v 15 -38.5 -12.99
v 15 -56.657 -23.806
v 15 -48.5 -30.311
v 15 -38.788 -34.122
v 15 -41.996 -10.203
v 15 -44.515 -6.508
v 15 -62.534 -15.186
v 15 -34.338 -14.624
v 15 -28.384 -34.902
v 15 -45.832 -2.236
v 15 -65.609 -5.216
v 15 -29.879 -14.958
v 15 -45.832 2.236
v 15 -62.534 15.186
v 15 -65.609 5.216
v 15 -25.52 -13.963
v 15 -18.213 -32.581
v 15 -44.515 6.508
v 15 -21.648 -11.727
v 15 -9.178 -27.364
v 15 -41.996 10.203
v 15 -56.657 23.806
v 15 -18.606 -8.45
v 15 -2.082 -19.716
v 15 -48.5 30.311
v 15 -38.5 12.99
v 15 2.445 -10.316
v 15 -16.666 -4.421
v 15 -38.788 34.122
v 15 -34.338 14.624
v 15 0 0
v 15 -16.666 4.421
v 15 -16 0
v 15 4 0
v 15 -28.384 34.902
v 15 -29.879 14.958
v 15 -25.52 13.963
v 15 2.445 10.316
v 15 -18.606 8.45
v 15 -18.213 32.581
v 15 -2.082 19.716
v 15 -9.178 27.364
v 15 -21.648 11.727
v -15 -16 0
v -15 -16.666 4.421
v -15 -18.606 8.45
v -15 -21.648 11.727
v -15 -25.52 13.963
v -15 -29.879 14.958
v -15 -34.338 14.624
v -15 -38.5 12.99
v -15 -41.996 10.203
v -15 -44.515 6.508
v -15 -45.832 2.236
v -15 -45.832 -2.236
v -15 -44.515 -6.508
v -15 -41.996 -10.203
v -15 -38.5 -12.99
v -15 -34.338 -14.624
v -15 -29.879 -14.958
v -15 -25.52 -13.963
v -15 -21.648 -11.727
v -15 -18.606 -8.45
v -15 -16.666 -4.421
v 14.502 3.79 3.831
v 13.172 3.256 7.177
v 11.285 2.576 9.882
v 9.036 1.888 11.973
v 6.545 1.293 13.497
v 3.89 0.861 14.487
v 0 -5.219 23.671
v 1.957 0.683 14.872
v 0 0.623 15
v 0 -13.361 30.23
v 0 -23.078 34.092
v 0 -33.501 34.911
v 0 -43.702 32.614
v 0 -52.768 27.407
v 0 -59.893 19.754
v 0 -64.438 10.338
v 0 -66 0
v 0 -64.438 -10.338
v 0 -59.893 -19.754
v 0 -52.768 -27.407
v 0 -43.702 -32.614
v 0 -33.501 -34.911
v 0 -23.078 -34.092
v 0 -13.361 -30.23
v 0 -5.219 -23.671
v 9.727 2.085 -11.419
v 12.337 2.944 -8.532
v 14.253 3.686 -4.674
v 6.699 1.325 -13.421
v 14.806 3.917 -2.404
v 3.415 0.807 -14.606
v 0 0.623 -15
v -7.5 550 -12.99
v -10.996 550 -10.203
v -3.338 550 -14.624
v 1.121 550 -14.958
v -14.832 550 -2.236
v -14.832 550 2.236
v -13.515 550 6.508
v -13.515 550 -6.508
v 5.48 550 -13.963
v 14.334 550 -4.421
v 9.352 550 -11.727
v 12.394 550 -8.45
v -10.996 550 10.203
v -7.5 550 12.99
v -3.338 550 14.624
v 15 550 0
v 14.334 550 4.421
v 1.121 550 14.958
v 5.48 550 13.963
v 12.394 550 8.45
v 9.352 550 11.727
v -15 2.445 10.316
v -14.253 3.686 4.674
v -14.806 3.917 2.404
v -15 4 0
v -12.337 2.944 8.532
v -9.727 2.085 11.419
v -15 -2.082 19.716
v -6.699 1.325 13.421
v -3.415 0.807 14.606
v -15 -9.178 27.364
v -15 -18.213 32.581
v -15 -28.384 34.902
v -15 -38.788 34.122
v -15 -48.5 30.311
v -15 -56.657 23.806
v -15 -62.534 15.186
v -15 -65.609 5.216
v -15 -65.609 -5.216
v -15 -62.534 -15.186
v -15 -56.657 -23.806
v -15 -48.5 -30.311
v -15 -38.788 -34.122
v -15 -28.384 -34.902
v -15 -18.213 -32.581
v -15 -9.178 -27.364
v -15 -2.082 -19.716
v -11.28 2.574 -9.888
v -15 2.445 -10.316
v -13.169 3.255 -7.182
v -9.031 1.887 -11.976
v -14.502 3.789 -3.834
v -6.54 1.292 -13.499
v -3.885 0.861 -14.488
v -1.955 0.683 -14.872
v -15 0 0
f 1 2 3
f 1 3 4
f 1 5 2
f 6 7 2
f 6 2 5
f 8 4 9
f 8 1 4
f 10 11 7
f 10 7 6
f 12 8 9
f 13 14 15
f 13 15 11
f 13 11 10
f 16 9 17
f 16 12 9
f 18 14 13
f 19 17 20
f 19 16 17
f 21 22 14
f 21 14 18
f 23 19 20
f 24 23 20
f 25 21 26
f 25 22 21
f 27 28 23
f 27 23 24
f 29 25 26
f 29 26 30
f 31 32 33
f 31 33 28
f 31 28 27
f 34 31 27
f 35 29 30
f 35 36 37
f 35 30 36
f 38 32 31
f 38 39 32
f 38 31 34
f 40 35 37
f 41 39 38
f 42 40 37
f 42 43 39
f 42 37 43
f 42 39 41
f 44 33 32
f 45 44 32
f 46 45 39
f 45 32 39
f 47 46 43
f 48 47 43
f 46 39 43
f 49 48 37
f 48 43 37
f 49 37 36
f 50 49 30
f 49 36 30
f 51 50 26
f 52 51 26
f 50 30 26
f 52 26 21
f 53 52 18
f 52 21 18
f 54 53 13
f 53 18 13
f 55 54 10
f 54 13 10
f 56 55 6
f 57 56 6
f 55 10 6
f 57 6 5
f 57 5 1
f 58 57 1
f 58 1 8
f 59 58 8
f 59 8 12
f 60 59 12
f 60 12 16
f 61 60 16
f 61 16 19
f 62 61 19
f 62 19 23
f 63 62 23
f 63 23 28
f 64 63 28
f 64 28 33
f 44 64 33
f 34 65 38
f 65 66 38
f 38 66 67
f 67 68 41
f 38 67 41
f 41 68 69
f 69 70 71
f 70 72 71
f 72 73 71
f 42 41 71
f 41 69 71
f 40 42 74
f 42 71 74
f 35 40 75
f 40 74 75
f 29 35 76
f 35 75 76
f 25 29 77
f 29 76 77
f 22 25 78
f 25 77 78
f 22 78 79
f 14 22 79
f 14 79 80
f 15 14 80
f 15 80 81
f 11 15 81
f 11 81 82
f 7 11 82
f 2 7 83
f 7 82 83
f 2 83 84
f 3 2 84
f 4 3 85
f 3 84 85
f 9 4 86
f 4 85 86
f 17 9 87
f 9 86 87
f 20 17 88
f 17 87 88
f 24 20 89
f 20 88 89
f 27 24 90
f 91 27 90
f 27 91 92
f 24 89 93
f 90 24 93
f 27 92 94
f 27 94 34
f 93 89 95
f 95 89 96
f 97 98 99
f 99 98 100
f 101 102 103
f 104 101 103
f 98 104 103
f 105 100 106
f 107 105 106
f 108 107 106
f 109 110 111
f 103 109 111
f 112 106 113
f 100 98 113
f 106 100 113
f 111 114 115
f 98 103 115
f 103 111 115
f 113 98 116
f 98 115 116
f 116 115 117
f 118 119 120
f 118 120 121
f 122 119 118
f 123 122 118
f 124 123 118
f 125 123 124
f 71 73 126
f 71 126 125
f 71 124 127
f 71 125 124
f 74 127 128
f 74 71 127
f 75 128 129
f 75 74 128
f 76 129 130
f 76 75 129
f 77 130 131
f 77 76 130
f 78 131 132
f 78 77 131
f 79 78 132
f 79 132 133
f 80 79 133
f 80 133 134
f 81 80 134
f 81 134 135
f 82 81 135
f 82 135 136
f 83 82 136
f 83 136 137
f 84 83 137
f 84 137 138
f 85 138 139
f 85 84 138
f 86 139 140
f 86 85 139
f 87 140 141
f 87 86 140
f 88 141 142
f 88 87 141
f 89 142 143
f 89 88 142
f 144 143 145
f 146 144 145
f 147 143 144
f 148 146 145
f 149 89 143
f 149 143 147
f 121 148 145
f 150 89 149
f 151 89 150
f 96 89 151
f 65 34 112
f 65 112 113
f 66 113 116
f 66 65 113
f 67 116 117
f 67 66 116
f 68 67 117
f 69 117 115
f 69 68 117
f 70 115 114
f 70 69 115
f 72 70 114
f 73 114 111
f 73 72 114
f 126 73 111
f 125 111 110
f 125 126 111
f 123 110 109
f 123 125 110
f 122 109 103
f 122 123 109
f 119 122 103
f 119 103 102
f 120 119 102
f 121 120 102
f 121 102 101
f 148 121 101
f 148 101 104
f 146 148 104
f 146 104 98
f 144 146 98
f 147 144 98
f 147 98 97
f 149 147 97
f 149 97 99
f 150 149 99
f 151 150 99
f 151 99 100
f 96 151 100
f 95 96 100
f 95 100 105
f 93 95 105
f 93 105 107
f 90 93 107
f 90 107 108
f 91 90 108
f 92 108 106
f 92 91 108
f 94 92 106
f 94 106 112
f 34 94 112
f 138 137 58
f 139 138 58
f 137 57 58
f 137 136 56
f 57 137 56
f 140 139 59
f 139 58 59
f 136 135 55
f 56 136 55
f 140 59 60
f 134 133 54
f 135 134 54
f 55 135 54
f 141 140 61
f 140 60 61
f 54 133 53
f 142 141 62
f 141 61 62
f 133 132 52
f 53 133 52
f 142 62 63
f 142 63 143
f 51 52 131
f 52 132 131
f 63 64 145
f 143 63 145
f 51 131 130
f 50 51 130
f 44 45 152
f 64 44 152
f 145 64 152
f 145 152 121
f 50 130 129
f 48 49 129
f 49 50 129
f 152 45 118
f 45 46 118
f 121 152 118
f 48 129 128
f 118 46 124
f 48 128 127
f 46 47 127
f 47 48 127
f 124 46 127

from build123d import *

# Parameters (mm, degrees)
F0_R          = 15
F1_DEPTH      = 550
F2_R          = 35
F3_DEPTH      = 15
F3_DEPTH_BACK = 15
F4_R          = 15
F5_DEPTH      = 30.001


with BuildPart() as f1:
    # F0 (on Front) → F1 (new body)
    with BuildSketch(Plane.XZ):
        Circle(F0_R)
    extrude(amount=-F1_DEPTH)

    # F2 (on Right) → F3 (join, two sides)
    with BuildSketch(Plane.YZ) as f3_sk:
        with Locations((-31, 0)):
            Circle(F2_R)
    extrude(amount=F3_DEPTH)
    extrude(f3_sk.sketch, amount=-F3_DEPTH_BACK)

    # F4 (on face) → F5 (cut, through all)
    with BuildSketch(Plane.YZ.offset(15)):
        with Locations((-31, 0)):
            Circle(F4_R)
    extrude(amount=-F5_DEPTH, mode=Mode.SUBTRACT)


solid = f1.part
